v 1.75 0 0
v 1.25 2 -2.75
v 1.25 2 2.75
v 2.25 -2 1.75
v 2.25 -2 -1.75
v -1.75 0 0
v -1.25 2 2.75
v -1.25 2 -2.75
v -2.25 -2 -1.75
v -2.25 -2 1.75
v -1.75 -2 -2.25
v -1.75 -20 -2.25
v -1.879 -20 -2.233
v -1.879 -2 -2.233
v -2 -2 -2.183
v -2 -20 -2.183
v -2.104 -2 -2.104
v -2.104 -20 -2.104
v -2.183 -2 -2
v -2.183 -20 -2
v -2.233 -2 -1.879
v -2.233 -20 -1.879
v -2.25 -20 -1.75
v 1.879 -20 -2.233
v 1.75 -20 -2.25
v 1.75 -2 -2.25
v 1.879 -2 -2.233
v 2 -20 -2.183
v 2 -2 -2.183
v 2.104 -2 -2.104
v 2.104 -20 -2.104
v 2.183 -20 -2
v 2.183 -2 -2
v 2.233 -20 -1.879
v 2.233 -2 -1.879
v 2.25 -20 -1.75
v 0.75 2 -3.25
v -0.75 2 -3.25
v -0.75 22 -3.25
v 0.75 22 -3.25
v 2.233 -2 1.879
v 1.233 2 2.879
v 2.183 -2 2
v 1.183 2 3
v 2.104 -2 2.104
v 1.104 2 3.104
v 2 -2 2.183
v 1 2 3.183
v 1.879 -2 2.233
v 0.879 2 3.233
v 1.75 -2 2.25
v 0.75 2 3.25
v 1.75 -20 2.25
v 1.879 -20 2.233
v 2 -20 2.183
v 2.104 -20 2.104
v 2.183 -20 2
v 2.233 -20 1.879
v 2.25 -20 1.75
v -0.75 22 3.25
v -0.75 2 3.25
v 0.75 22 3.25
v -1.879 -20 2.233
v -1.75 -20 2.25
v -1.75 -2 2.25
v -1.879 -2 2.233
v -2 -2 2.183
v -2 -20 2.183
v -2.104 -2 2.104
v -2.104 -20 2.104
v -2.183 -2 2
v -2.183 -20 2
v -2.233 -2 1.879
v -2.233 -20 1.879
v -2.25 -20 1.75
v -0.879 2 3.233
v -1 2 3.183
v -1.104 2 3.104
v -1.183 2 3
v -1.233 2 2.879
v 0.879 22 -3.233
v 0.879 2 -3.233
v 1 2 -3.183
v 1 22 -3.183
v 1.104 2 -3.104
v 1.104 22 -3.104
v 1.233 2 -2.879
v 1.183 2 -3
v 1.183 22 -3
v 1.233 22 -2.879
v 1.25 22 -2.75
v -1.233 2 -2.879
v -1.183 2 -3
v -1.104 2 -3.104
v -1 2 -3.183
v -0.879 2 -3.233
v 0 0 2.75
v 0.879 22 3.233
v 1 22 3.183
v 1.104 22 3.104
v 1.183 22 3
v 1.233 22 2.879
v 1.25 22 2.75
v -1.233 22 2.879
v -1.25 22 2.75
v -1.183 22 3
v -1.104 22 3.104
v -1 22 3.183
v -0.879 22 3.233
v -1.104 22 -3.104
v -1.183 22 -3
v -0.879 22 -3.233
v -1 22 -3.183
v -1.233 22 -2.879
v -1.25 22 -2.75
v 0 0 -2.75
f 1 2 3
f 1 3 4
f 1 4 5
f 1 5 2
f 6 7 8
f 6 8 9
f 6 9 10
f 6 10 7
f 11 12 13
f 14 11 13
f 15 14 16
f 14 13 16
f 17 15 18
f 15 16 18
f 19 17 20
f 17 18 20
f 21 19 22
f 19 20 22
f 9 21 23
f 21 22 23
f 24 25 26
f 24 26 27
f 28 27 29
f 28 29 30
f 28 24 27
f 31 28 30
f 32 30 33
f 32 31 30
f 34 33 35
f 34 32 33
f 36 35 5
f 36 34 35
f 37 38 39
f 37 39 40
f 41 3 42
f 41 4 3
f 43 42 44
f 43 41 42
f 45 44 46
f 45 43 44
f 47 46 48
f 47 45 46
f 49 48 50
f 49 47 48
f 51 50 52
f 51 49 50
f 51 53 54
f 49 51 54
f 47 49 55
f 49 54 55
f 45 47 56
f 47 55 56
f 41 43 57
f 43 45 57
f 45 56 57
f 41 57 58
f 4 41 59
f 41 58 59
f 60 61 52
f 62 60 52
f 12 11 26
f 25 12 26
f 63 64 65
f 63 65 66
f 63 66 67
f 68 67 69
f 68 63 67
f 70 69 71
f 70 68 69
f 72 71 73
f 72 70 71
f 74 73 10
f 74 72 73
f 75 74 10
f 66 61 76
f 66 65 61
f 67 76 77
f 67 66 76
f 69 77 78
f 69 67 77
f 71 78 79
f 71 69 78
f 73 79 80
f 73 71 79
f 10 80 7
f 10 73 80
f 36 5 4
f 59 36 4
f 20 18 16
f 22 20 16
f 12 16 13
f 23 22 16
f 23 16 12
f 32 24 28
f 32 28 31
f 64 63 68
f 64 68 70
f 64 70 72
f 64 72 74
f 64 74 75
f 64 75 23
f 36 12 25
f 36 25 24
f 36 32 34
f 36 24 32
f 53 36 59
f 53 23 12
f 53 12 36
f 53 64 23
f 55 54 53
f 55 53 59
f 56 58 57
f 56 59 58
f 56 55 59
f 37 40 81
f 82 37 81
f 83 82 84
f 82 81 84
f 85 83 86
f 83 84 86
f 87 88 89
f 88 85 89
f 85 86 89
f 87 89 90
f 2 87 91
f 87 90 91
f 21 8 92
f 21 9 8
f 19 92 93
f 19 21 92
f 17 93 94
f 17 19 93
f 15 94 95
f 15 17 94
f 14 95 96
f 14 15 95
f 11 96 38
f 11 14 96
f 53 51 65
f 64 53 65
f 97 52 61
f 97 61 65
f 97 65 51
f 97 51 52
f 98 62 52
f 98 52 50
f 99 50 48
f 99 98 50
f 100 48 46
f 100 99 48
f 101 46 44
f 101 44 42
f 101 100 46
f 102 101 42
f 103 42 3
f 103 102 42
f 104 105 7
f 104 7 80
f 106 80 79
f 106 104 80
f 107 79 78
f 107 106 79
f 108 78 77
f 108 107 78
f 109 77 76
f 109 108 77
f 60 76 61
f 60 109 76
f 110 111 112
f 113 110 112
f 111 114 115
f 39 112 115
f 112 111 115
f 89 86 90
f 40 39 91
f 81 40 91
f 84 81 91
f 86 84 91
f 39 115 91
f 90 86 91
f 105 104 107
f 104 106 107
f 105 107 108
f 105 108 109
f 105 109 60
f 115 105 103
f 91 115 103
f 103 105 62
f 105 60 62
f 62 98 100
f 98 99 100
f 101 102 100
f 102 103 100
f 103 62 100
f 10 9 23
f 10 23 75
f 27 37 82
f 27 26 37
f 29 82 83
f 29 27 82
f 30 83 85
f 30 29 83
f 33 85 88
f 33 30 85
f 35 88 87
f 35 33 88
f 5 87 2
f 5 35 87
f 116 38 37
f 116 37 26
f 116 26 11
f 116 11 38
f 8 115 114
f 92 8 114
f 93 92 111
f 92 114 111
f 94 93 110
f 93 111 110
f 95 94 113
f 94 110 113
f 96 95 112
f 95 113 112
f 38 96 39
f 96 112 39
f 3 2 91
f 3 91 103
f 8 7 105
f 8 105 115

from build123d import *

# Parameters (mm, degrees)
F0_W     = 2.5
F0_H     = 4.5
F0_W_2   = 1
F1_DEPTH = 20
F0_H_2   = 1
F2_DEPTH = 22
F3_R     = 0.5
F4_W     = 4
F4_H     = 10
F5_DEPTH = 12.5


with BuildPart() as f1:
    # F0 (on Front) → F1 (new body)
    with BuildSketch(Plane.XZ):
        Rectangle(F0_W, F0_H)
        with Locations((1.75, 0)):
            Rectangle(F0_W_2, F0_H)
        with Locations((-1.75, 0)):
            Rectangle(F0_W_2, F0_H)
    extrude(amount=F1_DEPTH)

    # F0 (on Front) → F2 (join)
    with BuildSketch(Plane.XZ):
        with Locations((0, 2.75)):
            Rectangle(F0_W, F0_H_2)
        Rectangle(F0_W, F0_H)
        with Locations((0, -2.75)):
            Rectangle(F0_W, F0_H_2)
    extrude(amount=-F2_DEPTH)

    # F3
    f3_edges = [f1.edges().sort_by_distance(p)[0] for p in [
        (-2.25, -10, 2.25),
        (-1.25, 11, 3.25),
        (1.25, 11, 3.25),
        (-1.25, 11, -3.25),
        (-2.25, -10, -2.25),
        (1.25, 11, -3.25),
        (2.25, -10, -2.25),
        (2.25, -10, 2.25),
    ]]
    fillet(f3_edges, radius=F3_R)

    # F4 (on Right) → F5 (cut, symmetric)
    with BuildSketch(Plane.YZ):
        Rectangle(F4_W, F4_H)
    extrude(amount=F5_DEPTH, both=True, mode=Mode.SUBTRACT)

    # F5_face (on face) → F6 section 0
    with BuildSketch(Plane.XZ.offset(-2)):
        with BuildLine():
            Line((1.25, -2.75), (1.25, 2.75))
            ThreePointArc((1.25, 2.75), (1.1035533906, 3.1035533906), (0.75, 3.25))
            Line((0.75, 3.25), (-0.75, 3.25))
            ThreePointArc((-0.75, 3.25), (-1.1035533906, 3.1035533906), (-1.25, 2.75))
            Line((-1.25, 2.75), (-1.25, -2.75))
            ThreePointArc((-1.25, -2.75), (-1.1035533906, -3.1035533906), (-0.75, -3.25))
            Line((-0.75, -3.25), (0.75, -3.25))
            ThreePointArc((0.75, -3.25), (1.1035533906, -3.1035533906), (1.25, -2.75))
        make_face()
    # F5_face1 (on face) → F6 section 1
    with BuildSketch(Plane(origin=(0, -2, 0), x_dir=(-1, 0, 0), z_dir=(0, 1, 0))):
        with BuildLine():
            ThreePointArc((-2.25, -1.75), (-2.1035533906, -2.1035533906), (-1.75, -2.25))
            Line((-1.75, -2.25), (1.75, -2.25))
            ThreePointArc((1.75, -2.25), (2.1035533906, -2.1035533906), (2.25, -1.75))
            Line((2.25, -1.75), (2.25, 1.75))
            ThreePointArc((2.25, 1.75), (2.1035533906, 2.1035533906), (1.75, 2.25))
            Line((1.75, 2.25), (-1.75, 2.25))
            ThreePointArc((-1.75, 2.25), (-2.1035533906, 2.1035533906), (-2.25, 1.75))
            Line((-2.25, 1.75), (-2.25, -1.75))
        make_face()
    loft()


solid = f1.part
